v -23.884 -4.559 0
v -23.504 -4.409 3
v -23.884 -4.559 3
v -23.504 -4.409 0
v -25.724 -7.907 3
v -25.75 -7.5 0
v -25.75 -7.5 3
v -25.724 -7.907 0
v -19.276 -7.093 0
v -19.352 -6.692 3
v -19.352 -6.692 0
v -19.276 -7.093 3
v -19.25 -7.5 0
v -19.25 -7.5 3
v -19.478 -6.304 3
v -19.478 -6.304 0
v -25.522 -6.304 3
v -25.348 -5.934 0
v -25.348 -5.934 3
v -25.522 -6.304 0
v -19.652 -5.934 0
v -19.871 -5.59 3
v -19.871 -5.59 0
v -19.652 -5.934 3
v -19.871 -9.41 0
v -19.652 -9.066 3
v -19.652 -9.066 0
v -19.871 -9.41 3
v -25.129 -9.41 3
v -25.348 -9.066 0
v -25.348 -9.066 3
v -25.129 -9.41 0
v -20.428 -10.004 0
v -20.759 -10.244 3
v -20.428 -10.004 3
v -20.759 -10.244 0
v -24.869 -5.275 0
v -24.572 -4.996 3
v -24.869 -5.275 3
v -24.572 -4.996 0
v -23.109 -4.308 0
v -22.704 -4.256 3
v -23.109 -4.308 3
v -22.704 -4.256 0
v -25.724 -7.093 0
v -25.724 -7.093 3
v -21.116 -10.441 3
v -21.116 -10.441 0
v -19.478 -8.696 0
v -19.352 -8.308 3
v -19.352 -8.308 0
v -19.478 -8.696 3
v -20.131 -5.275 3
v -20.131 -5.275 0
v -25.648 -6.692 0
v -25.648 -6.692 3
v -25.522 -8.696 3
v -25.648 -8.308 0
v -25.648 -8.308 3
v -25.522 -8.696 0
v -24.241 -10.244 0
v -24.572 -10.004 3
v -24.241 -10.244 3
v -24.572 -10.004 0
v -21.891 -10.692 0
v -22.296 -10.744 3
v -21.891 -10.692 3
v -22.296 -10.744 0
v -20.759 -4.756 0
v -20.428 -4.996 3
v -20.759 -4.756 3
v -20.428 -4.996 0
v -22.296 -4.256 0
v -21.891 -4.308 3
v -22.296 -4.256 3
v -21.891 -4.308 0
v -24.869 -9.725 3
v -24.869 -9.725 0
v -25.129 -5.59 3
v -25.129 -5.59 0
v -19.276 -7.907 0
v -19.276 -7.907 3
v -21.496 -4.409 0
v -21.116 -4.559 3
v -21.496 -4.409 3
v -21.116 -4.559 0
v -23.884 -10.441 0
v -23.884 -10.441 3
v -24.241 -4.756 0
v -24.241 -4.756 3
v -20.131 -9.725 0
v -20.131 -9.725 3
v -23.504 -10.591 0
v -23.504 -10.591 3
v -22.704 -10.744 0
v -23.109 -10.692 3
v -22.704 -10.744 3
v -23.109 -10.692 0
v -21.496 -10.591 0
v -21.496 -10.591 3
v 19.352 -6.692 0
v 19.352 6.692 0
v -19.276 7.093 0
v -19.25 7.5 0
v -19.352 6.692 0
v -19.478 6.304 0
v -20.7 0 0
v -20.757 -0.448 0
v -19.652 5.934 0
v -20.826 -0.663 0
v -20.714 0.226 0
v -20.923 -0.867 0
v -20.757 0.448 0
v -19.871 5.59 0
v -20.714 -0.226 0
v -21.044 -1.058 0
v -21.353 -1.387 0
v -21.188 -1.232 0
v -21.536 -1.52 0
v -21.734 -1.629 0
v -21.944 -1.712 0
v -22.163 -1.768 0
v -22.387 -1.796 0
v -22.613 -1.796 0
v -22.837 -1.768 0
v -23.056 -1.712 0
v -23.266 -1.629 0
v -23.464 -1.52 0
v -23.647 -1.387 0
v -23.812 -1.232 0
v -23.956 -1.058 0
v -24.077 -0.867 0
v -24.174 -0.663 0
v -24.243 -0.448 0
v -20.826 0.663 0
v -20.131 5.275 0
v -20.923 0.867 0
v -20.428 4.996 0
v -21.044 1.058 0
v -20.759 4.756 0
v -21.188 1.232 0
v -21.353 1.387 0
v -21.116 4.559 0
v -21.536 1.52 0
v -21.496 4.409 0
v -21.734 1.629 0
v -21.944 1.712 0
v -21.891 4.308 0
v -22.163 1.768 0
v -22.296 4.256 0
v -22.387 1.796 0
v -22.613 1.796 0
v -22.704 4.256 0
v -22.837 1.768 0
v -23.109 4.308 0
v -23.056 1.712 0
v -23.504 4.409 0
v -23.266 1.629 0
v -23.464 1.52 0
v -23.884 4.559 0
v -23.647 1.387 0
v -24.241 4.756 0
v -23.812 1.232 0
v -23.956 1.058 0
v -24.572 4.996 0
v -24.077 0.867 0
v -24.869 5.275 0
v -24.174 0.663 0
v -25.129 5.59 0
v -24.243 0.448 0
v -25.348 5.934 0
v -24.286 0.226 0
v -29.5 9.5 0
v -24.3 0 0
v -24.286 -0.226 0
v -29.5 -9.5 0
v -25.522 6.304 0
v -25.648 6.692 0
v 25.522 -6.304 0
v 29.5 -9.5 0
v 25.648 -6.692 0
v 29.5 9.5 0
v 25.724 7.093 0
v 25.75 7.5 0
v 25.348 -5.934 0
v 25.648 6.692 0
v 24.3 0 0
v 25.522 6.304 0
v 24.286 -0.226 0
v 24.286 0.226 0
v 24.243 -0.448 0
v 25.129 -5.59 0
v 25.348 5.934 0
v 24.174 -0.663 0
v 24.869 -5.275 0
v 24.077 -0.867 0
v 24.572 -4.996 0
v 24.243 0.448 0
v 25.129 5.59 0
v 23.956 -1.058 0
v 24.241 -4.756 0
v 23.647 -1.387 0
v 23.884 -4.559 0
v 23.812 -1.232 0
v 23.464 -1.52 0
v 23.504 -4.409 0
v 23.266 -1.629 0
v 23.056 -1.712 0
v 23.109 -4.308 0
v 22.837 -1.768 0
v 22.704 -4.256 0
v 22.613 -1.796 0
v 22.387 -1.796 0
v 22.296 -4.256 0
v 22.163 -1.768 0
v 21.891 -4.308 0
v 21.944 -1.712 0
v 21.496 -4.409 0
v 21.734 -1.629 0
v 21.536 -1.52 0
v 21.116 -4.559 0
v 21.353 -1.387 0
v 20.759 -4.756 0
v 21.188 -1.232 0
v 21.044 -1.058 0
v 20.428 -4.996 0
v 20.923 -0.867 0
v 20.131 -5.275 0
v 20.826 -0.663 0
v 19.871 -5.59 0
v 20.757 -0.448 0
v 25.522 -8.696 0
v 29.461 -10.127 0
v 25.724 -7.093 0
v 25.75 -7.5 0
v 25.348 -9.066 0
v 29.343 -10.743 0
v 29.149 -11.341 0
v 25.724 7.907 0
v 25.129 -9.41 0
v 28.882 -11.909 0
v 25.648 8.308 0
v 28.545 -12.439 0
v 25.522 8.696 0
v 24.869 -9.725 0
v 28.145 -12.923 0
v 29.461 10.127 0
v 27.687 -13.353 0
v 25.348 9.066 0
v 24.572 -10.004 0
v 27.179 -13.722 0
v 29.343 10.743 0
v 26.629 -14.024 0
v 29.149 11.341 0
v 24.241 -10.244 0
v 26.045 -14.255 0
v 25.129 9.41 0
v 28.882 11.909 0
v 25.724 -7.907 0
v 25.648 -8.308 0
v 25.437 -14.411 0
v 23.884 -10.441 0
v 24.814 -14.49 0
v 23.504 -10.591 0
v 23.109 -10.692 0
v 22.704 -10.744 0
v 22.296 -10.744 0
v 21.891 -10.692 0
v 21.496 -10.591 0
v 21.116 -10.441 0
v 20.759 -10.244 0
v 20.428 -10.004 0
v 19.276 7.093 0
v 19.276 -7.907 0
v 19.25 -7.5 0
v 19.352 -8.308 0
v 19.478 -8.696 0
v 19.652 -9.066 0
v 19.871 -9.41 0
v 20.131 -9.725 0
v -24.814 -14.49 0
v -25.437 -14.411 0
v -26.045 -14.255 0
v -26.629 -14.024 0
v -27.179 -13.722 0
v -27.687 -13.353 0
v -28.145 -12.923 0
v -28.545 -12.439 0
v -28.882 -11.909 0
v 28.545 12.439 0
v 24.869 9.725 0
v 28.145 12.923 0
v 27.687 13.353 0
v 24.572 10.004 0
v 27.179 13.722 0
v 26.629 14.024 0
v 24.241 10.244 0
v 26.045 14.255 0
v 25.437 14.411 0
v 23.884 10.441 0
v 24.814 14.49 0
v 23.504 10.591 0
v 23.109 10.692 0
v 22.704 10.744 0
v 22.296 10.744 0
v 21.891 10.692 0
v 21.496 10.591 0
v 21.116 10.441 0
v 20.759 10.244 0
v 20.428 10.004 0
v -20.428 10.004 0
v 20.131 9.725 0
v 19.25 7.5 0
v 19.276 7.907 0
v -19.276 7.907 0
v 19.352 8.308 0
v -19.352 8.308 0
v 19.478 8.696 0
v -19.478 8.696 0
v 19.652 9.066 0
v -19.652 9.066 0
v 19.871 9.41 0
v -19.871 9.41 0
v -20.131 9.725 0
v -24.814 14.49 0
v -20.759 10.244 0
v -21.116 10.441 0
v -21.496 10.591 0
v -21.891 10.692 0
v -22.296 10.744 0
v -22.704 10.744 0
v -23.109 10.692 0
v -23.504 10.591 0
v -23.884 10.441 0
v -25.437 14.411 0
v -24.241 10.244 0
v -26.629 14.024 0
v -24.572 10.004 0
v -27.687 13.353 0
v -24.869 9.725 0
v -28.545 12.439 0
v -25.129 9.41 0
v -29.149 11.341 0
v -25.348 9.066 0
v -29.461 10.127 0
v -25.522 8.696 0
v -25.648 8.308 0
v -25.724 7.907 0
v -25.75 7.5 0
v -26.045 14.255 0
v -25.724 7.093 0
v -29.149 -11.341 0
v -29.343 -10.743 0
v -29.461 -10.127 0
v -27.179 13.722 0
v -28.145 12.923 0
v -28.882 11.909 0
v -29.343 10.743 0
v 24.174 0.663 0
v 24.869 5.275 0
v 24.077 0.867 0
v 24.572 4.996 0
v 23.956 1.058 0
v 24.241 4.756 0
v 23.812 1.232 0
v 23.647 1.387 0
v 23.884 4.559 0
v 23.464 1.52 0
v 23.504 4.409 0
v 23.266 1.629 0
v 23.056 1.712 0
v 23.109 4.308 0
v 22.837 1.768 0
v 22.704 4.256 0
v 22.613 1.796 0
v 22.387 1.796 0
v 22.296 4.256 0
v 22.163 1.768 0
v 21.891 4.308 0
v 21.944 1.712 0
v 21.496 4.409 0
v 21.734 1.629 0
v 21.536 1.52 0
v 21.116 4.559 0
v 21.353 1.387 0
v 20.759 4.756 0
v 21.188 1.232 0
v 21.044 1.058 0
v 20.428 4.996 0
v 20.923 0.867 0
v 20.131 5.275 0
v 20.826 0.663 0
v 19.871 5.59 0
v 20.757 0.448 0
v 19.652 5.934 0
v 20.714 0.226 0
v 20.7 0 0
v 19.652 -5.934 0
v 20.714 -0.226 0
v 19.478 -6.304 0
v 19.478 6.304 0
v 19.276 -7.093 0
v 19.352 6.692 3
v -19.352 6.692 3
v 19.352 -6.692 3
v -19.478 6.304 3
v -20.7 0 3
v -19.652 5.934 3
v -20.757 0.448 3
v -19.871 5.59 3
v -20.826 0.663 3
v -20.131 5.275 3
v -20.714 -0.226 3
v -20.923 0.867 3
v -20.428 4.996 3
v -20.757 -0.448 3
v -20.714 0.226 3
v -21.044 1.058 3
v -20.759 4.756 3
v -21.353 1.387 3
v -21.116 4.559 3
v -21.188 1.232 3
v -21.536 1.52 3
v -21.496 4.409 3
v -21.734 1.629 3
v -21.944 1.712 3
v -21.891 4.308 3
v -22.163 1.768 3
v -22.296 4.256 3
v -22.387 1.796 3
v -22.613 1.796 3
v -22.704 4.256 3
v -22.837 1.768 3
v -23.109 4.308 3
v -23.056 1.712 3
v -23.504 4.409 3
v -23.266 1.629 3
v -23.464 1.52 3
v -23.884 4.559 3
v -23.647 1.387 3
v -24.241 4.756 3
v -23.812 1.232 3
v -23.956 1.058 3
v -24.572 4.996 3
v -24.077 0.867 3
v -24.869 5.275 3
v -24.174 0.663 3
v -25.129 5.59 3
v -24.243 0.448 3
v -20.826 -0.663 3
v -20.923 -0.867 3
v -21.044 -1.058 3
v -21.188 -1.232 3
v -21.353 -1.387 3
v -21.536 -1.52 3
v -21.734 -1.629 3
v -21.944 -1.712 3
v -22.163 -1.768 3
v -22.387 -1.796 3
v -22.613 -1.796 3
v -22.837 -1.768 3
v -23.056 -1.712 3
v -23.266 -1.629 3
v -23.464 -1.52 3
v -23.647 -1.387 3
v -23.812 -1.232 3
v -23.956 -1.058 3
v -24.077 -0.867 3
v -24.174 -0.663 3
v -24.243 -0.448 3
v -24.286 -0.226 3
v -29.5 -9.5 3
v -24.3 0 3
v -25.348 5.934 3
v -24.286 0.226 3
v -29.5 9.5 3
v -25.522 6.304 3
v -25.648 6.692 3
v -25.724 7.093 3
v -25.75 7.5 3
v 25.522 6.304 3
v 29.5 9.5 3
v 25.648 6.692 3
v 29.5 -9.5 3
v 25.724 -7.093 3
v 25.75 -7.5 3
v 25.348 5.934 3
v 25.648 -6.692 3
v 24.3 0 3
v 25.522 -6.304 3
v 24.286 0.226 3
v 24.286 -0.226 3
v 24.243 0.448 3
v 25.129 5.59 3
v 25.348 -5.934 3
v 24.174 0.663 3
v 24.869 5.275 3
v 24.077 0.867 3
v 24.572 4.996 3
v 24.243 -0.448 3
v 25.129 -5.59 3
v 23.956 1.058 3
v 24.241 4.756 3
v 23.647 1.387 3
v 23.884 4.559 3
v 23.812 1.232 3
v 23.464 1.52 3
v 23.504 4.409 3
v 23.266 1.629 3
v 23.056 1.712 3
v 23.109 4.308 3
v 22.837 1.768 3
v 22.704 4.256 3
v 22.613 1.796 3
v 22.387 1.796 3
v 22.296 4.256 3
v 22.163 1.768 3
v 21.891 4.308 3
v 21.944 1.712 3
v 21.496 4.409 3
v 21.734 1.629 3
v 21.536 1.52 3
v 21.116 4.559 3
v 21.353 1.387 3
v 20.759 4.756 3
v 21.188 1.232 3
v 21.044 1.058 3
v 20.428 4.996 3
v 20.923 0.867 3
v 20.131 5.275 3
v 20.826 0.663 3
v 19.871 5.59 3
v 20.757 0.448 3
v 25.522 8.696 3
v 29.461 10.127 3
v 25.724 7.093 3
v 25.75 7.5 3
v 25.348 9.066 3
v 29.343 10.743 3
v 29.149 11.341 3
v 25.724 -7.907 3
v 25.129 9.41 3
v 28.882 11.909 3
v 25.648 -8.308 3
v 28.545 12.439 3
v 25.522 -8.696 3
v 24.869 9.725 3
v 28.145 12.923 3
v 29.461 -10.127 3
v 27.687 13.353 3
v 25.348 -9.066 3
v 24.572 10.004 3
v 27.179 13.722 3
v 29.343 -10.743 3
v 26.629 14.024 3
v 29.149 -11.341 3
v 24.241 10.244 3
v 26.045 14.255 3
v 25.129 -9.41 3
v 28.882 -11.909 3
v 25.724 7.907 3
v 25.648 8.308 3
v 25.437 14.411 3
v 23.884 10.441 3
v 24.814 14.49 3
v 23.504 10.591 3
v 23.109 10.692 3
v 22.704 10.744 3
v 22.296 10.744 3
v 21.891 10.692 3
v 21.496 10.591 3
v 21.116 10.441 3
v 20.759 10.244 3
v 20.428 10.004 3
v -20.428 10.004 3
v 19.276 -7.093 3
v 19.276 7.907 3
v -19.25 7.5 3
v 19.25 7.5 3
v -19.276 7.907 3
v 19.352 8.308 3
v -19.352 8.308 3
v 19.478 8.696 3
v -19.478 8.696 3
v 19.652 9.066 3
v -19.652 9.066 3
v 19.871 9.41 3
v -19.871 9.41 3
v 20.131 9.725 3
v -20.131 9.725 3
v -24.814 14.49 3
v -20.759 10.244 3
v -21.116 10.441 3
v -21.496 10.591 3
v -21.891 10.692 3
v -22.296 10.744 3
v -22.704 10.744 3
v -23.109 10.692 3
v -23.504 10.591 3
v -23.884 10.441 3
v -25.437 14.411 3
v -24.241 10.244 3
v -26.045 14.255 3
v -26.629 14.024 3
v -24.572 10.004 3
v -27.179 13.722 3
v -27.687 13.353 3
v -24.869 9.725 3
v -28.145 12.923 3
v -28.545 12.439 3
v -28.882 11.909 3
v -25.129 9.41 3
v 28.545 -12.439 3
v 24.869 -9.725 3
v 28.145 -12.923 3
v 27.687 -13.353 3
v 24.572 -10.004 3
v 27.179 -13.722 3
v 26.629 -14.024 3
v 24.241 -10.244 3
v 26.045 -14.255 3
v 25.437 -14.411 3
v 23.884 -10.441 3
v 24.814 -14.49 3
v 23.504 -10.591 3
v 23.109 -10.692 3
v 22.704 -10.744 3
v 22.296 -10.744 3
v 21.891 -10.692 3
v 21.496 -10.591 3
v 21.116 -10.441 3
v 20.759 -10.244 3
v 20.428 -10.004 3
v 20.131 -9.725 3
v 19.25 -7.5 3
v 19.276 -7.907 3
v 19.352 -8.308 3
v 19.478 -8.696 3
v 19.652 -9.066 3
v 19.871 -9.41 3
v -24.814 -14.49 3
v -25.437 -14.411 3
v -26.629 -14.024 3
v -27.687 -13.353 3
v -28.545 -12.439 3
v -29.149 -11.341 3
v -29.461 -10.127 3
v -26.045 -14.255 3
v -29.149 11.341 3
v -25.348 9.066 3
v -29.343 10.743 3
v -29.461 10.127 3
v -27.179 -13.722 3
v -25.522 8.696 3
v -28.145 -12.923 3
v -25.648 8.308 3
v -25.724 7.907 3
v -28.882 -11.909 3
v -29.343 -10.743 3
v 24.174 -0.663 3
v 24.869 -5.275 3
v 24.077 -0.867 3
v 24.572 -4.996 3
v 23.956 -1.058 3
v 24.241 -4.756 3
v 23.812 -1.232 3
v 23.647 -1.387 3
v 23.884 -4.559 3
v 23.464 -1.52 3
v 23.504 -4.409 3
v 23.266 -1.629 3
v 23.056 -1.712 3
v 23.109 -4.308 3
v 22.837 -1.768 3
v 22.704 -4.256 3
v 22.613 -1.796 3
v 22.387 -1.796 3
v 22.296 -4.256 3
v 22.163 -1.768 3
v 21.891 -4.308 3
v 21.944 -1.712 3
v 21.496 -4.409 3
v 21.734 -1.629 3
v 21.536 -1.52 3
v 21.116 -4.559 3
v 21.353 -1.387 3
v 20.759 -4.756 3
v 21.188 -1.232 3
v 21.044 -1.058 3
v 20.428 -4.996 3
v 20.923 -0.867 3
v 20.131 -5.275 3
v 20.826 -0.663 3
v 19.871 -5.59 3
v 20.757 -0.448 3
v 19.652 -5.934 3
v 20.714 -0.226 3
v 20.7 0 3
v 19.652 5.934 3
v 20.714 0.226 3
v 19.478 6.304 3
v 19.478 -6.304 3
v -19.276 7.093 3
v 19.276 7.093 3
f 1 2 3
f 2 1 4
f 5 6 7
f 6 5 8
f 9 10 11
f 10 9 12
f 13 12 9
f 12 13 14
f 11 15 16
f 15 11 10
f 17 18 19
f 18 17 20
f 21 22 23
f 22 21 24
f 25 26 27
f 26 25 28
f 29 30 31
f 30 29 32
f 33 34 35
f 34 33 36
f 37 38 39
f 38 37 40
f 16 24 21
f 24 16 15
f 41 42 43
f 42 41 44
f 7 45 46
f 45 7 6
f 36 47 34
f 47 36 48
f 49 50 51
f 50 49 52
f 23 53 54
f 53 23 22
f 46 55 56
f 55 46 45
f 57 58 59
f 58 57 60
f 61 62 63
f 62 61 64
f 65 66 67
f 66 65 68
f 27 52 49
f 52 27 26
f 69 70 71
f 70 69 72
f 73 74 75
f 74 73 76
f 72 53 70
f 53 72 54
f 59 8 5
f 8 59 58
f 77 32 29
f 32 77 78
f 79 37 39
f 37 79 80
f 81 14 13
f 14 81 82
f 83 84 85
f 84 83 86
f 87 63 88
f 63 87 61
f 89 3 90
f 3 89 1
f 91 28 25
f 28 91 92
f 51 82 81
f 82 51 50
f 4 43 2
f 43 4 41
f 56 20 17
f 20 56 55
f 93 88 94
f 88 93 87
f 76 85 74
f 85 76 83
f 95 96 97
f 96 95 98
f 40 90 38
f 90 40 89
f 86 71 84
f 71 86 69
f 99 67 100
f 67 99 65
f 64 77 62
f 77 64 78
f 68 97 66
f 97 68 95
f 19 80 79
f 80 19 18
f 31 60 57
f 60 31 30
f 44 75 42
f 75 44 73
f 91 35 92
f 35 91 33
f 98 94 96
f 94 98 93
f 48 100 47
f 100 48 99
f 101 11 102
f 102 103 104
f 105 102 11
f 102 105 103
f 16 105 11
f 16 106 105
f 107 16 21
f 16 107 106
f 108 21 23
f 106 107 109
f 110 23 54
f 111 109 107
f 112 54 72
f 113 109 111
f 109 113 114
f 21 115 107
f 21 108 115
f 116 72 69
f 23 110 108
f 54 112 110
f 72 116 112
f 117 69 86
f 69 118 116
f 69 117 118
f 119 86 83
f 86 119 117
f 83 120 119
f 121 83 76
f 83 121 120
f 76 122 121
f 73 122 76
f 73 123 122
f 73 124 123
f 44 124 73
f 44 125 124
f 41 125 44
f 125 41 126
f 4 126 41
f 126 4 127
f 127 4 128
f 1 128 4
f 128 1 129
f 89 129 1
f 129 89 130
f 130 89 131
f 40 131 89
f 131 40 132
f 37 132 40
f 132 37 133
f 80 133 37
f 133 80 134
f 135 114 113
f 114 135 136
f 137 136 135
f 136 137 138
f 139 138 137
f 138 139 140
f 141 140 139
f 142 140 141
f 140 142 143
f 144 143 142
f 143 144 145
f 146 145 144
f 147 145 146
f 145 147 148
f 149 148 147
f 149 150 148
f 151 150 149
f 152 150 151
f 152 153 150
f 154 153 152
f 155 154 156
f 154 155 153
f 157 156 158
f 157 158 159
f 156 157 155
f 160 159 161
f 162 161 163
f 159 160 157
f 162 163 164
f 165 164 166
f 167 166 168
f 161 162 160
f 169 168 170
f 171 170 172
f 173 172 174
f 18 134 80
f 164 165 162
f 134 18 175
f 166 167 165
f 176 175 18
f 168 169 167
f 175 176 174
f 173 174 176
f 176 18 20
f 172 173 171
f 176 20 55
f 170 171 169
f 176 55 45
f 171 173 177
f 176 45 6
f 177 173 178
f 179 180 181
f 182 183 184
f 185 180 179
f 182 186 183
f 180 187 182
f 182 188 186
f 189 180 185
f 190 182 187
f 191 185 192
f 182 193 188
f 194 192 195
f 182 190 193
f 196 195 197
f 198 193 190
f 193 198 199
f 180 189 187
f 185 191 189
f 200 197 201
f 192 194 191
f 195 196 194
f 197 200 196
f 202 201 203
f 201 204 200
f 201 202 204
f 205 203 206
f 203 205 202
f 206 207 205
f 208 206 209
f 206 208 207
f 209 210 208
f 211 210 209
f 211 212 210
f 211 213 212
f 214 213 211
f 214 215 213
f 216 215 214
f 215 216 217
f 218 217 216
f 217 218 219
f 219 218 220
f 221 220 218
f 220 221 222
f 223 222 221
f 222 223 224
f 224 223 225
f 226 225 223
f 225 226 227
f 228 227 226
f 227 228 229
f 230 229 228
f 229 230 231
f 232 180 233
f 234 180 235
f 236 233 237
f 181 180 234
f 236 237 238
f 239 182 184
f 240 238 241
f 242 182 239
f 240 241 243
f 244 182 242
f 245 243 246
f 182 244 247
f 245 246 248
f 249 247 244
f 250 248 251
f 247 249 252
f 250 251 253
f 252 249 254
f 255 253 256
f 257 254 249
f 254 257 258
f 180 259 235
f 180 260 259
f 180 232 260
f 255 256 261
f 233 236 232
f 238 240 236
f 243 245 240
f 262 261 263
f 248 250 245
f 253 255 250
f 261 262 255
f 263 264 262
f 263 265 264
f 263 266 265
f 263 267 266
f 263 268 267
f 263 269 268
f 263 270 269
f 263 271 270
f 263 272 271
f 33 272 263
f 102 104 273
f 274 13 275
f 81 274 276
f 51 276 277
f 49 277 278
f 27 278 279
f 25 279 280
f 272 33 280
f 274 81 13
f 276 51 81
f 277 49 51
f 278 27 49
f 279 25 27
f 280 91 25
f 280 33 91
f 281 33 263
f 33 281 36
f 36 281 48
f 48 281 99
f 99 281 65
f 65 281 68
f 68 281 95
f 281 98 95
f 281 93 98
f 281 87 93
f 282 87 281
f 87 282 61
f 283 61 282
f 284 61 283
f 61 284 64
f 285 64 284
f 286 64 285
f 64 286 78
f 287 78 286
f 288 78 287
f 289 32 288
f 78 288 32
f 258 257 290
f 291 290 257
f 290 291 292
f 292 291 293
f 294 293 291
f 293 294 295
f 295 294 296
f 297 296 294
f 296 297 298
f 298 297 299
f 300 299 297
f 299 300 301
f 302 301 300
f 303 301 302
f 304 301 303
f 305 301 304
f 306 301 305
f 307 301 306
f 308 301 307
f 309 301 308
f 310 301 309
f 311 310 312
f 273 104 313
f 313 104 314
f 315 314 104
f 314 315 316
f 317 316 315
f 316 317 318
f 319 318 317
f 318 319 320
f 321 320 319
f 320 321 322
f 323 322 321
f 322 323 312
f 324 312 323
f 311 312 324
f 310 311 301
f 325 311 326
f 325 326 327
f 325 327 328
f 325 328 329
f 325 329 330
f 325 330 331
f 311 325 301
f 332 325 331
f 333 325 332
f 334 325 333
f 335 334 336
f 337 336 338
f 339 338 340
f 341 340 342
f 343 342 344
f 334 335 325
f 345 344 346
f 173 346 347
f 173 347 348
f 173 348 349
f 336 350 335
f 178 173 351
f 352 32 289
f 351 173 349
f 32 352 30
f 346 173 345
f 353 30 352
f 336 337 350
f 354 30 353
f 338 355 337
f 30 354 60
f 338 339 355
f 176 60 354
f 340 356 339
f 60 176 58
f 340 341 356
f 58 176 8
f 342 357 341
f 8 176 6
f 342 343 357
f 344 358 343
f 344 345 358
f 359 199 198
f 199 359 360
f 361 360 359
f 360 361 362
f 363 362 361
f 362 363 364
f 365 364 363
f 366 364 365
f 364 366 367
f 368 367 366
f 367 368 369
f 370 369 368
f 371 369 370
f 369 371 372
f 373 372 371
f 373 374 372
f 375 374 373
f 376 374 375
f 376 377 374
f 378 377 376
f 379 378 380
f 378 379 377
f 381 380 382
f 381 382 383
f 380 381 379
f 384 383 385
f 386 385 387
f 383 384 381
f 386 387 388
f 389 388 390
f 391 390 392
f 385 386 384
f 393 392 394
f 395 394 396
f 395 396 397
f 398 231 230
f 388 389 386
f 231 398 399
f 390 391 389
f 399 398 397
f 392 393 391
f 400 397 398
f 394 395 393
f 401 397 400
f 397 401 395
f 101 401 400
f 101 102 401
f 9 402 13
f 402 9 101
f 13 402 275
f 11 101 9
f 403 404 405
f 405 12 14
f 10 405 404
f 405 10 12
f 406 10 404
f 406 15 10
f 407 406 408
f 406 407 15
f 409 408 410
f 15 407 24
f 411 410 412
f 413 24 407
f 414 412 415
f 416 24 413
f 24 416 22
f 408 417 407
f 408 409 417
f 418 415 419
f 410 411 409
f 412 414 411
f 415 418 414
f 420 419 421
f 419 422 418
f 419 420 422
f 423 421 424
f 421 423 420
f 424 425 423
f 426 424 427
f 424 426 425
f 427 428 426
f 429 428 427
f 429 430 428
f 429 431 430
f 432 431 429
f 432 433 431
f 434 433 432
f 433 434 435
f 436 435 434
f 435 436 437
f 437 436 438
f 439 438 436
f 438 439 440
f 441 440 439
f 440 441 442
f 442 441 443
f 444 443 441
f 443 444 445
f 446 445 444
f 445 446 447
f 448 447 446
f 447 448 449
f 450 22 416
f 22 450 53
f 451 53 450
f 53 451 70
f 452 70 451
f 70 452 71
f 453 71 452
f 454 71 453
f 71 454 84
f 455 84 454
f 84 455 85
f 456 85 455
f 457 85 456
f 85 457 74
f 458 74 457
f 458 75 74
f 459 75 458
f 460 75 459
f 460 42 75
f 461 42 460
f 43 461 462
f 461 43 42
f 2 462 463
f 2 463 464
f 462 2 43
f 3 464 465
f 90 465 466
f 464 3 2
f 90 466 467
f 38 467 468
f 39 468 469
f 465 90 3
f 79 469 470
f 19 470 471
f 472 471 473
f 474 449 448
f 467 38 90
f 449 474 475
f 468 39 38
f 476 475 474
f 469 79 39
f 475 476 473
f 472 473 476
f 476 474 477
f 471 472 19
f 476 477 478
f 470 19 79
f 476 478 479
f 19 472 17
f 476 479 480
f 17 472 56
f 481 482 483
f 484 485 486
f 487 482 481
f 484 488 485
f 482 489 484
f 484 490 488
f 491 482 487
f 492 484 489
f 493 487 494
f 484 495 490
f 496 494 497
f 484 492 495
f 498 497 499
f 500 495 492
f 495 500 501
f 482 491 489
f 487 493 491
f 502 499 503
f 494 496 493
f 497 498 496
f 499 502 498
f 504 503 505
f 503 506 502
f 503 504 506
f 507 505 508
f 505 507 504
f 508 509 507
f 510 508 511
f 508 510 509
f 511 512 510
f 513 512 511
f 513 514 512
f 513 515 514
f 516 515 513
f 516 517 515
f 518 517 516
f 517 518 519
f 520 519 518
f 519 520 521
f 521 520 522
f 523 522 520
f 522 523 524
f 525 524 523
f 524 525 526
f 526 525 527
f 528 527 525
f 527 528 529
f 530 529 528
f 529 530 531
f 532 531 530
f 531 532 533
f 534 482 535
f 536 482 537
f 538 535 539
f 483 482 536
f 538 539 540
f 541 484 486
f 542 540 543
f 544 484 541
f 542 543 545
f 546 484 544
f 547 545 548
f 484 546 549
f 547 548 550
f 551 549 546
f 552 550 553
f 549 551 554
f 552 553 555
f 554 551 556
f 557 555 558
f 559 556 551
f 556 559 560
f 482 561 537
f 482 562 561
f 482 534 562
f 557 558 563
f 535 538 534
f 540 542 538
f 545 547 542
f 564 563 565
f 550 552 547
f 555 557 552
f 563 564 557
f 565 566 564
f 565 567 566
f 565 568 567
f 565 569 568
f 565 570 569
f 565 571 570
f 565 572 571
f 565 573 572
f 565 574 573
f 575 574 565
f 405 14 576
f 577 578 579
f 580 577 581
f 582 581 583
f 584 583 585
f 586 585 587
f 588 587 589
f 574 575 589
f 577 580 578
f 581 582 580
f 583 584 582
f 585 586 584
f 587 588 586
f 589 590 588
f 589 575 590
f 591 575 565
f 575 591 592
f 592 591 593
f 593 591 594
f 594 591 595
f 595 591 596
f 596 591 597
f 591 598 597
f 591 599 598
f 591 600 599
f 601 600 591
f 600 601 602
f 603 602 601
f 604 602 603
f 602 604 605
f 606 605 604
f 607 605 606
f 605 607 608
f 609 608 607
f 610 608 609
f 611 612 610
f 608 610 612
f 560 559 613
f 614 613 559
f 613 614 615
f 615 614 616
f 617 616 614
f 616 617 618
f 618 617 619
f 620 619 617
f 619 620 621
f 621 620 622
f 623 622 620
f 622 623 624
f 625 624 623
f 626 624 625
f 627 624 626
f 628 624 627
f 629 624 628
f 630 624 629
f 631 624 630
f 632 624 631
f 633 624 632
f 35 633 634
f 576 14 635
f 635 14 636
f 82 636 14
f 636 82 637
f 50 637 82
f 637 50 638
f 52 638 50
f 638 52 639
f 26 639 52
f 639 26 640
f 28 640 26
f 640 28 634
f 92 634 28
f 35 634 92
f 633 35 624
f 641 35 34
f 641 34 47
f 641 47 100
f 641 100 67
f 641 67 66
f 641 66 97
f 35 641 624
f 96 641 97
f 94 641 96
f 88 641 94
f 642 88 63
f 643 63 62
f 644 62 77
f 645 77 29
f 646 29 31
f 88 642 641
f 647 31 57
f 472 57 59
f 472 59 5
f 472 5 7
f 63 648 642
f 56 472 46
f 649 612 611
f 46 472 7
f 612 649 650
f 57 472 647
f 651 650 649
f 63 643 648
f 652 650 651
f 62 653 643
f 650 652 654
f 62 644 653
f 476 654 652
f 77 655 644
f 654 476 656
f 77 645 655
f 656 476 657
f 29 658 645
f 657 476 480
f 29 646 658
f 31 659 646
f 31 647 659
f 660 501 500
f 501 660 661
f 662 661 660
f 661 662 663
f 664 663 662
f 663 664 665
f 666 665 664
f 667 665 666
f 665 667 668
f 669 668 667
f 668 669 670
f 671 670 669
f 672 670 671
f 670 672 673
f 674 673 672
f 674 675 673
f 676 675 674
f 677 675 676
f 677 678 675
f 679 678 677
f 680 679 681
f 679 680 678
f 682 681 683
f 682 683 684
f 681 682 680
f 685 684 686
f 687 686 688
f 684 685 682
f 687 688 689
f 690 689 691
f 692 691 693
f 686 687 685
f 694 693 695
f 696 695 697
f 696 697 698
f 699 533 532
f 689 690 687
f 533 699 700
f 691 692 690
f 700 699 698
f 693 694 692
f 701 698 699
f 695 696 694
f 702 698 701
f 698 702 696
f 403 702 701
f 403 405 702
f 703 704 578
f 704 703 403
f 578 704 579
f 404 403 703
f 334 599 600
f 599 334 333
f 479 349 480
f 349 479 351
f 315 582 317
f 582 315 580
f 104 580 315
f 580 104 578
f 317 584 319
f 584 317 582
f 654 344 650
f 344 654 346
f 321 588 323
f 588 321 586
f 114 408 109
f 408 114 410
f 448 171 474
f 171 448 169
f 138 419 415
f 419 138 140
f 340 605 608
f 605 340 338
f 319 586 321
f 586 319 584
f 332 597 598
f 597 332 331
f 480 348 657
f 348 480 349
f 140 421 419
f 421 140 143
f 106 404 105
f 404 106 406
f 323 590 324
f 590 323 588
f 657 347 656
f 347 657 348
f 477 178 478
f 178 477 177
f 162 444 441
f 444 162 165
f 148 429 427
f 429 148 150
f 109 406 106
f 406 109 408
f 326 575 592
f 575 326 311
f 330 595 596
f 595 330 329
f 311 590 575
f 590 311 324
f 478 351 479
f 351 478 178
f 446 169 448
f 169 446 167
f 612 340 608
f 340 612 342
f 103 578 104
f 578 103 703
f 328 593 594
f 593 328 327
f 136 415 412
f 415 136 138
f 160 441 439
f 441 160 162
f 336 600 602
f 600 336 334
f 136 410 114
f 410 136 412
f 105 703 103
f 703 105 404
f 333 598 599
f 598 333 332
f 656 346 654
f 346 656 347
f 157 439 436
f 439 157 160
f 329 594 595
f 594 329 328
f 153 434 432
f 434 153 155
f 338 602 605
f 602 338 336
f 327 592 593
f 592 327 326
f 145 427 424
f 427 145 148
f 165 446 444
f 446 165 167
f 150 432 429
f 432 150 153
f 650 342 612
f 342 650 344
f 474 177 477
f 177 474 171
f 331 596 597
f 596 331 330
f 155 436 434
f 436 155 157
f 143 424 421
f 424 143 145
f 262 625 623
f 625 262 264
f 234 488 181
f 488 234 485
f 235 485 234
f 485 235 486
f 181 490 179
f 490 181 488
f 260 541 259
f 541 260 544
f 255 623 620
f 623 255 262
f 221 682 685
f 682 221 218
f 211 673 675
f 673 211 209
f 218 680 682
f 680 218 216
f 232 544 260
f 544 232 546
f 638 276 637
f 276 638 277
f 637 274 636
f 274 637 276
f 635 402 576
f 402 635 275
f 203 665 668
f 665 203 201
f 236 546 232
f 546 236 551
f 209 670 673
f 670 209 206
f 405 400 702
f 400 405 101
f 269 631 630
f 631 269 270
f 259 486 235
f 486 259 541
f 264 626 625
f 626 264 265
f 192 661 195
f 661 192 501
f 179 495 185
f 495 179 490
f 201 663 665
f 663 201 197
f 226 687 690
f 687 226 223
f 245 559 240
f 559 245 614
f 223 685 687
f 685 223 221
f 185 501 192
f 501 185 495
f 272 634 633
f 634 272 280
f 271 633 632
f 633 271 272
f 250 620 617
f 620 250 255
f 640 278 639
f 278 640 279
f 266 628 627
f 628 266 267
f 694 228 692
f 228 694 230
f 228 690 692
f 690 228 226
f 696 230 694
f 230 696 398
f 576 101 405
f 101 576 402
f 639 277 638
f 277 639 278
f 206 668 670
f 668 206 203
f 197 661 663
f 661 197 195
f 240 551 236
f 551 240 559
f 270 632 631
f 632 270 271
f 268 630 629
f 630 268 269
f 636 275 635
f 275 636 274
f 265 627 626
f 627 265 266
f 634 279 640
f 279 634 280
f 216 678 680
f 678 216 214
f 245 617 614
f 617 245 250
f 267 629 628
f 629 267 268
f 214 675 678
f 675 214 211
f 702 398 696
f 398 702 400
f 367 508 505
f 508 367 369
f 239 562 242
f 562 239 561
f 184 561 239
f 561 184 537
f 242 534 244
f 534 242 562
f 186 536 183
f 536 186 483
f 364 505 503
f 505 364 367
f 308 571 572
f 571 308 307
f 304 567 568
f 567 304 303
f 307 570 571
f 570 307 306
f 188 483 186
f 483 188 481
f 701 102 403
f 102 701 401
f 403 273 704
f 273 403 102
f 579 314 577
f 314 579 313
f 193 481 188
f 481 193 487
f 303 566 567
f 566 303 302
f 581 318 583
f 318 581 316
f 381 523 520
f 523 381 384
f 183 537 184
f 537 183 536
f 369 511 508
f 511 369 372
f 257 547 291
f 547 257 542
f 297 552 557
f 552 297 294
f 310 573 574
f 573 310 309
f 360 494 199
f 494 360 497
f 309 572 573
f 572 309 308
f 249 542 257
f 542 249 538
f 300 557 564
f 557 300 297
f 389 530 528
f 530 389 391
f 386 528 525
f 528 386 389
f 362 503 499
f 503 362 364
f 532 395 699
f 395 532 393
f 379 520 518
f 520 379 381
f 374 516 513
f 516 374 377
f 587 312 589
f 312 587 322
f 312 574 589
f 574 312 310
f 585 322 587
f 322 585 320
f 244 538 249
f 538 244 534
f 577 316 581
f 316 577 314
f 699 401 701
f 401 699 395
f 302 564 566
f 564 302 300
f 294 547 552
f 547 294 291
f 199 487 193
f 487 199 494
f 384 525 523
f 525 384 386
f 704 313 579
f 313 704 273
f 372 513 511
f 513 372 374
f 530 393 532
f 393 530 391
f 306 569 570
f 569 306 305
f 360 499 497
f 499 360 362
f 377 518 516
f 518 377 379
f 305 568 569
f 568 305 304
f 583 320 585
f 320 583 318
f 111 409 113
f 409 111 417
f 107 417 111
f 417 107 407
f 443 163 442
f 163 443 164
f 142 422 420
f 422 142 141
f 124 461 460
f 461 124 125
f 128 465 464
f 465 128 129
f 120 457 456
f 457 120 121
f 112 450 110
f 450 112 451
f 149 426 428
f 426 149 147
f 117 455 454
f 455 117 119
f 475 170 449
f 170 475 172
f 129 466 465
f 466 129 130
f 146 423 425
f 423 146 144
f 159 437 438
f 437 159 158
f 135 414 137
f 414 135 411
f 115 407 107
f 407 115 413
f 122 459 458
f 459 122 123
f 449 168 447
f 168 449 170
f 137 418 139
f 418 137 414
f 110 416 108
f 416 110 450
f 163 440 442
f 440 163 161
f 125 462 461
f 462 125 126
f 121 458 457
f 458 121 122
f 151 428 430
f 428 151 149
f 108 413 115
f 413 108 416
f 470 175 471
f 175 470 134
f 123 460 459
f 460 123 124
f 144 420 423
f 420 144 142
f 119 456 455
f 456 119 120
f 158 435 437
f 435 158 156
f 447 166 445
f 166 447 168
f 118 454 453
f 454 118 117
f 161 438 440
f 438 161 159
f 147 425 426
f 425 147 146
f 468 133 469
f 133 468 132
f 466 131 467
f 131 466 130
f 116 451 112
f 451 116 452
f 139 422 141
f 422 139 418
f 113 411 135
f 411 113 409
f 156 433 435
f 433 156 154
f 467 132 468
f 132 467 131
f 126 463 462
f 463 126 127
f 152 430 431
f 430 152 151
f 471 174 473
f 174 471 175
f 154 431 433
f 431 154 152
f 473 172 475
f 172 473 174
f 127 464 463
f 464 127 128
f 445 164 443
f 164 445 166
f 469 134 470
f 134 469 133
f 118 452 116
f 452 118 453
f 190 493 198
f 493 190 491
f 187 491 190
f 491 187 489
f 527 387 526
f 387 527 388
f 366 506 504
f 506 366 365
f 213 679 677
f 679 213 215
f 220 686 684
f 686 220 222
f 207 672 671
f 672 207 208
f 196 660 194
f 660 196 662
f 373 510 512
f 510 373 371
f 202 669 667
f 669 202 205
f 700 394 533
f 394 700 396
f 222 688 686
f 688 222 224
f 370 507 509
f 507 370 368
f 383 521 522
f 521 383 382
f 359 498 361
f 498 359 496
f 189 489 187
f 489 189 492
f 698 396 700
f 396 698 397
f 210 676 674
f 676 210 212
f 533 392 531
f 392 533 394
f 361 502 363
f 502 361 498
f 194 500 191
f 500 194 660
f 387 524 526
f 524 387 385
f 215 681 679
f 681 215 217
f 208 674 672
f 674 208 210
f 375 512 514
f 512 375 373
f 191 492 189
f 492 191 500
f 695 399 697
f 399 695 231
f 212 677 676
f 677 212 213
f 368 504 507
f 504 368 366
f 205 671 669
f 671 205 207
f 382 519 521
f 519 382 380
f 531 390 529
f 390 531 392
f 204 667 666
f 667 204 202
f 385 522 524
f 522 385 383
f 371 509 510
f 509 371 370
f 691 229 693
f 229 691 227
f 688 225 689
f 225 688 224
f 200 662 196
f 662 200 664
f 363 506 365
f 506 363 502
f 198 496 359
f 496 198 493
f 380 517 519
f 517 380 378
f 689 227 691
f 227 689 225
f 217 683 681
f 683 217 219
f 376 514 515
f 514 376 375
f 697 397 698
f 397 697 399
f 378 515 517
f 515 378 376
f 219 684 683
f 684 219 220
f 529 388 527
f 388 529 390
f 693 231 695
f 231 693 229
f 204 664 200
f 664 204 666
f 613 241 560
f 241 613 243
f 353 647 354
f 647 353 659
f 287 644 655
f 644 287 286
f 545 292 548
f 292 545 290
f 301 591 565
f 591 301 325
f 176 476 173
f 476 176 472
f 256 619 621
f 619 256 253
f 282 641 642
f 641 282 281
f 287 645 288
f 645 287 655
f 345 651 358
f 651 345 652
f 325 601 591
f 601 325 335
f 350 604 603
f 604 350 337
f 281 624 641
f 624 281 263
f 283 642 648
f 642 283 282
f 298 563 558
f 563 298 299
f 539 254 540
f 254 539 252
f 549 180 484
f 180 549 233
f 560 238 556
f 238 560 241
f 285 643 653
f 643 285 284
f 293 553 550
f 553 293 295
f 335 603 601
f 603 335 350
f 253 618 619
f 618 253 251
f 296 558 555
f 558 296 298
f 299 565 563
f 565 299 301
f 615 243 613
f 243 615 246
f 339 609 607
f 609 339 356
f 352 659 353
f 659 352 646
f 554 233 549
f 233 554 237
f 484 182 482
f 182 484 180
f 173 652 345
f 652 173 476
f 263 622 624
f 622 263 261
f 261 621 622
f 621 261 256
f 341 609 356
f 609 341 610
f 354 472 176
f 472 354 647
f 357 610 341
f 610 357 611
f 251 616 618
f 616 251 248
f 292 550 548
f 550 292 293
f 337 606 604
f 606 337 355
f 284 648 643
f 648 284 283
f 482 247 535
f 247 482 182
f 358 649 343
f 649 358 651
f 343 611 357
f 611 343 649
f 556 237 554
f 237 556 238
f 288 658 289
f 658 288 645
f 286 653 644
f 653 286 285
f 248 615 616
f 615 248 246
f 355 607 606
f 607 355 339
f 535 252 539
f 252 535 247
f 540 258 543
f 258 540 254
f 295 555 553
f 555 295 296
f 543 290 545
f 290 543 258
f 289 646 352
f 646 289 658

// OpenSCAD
$fn = 50;


difference() {
	union() {
		hull() {
			translate(v = [-24.5000000000, 9.5000000000, 0]) {
				cylinder(h = 3, r = 5);
			}
			translate(v = [24.5000000000, 9.5000000000, 0]) {
				cylinder(h = 3, r = 5);
			}
			translate(v = [-24.5000000000, -9.5000000000, 0]) {
				cylinder(h = 3, r = 5);
			}
			translate(v = [24.5000000000, -9.5000000000, 0]) {
				cylinder(h = 3, r = 5);
			}
		}
	}
	union() {
		translate(v = [-22.5000000000, -7.5000000000, 0]) {
			cylinder(h = 3, r = 3.2500000000);
		}
		translate(v = [-22.5000000000, 7.5000000000, 0]) {
			cylinder(h = 3, r = 3.2500000000);
		}
		translate(v = [22.5000000000, -7.5000000000, 0]) {
			cylinder(h = 3, r = 3.2500000000);
		}
		translate(v = [22.5000000000, 7.5000000000, 0]) {
			cylinder(h = 3, r = 3.2500000000);
		}
		translate(v = [-22.5000000000, -7.5000000000, 0]) {
			cylinder(h = 3, r = 1.8000000000);
		}
		translate(v = [-22.5000000000, 0.0000000000, 0]) {
			cylinder(h = 3, r = 1.8000000000);
		}
		translate(v = [-22.5000000000, 7.5000000000, 0]) {
			cylinder(h = 3, r = 1.8000000000);
		}
		translate(v = [22.5000000000, -7.5000000000, 0]) {
			cylinder(h = 3, r = 1.8000000000);
		}
		translate(v = [22.5000000000, 0.0000000000, 0]) {
			cylinder(h = 3, r = 1.8000000000);
		}
		translate(v = [22.5000000000, 7.5000000000, 0]) {
			cylinder(h = 3, r = 1.8000000000);
		}
		translate(v = [-22.5000000000, -7.5000000000, 0]) {
			cylinder(h = 3, r = 1.8000000000);
		}
		translate(v = [-22.5000000000, 0.0000000000, 0]) {
			cylinder(h = 3, r = 1.8000000000);
		}
		translate(v = [-22.5000000000, 7.5000000000, 0]) {
			cylinder(h = 3, r = 1.8000000000);
		}
		translate(v = [22.5000000000, -7.5000000000, 0]) {
			cylinder(h = 3, r = 1.8000000000);
		}
		translate(v = [22.5000000000, 0.0000000000, 0]) {
			cylinder(h = 3, r = 1.8000000000);
		}
		translate(v = [22.5000000000, 7.5000000000, 0]) {
			cylinder(h = 3, r = 1.8000000000);
		}
		translate(v = [-22.5000000000, -7.5000000000, 0]) {
			cylinder(h = 3, r = 1.8000000000);
		}
		translate(v = [-22.5000000000, 0.0000000000, 0]) {
			cylinder(h = 3, r = 1.8000000000);
		}
		translate(v = [-22.5000000000, 7.5000000000, 0]) {
			cylinder(h = 3, r = 1.8000000000);
		}
		translate(v = [22.5000000000, -7.5000000000, 0]) {
			cylinder(h = 3, r = 1.8000000000);
		}
		translate(v = [22.5000000000, 0.0000000000, 0]) {
			cylinder(h = 3, r = 1.8000000000);
		}
		translate(v = [22.5000000000, 7.5000000000, 0]) {
			cylinder(h = 3, r = 1.8000000000);
		}
	}
}
